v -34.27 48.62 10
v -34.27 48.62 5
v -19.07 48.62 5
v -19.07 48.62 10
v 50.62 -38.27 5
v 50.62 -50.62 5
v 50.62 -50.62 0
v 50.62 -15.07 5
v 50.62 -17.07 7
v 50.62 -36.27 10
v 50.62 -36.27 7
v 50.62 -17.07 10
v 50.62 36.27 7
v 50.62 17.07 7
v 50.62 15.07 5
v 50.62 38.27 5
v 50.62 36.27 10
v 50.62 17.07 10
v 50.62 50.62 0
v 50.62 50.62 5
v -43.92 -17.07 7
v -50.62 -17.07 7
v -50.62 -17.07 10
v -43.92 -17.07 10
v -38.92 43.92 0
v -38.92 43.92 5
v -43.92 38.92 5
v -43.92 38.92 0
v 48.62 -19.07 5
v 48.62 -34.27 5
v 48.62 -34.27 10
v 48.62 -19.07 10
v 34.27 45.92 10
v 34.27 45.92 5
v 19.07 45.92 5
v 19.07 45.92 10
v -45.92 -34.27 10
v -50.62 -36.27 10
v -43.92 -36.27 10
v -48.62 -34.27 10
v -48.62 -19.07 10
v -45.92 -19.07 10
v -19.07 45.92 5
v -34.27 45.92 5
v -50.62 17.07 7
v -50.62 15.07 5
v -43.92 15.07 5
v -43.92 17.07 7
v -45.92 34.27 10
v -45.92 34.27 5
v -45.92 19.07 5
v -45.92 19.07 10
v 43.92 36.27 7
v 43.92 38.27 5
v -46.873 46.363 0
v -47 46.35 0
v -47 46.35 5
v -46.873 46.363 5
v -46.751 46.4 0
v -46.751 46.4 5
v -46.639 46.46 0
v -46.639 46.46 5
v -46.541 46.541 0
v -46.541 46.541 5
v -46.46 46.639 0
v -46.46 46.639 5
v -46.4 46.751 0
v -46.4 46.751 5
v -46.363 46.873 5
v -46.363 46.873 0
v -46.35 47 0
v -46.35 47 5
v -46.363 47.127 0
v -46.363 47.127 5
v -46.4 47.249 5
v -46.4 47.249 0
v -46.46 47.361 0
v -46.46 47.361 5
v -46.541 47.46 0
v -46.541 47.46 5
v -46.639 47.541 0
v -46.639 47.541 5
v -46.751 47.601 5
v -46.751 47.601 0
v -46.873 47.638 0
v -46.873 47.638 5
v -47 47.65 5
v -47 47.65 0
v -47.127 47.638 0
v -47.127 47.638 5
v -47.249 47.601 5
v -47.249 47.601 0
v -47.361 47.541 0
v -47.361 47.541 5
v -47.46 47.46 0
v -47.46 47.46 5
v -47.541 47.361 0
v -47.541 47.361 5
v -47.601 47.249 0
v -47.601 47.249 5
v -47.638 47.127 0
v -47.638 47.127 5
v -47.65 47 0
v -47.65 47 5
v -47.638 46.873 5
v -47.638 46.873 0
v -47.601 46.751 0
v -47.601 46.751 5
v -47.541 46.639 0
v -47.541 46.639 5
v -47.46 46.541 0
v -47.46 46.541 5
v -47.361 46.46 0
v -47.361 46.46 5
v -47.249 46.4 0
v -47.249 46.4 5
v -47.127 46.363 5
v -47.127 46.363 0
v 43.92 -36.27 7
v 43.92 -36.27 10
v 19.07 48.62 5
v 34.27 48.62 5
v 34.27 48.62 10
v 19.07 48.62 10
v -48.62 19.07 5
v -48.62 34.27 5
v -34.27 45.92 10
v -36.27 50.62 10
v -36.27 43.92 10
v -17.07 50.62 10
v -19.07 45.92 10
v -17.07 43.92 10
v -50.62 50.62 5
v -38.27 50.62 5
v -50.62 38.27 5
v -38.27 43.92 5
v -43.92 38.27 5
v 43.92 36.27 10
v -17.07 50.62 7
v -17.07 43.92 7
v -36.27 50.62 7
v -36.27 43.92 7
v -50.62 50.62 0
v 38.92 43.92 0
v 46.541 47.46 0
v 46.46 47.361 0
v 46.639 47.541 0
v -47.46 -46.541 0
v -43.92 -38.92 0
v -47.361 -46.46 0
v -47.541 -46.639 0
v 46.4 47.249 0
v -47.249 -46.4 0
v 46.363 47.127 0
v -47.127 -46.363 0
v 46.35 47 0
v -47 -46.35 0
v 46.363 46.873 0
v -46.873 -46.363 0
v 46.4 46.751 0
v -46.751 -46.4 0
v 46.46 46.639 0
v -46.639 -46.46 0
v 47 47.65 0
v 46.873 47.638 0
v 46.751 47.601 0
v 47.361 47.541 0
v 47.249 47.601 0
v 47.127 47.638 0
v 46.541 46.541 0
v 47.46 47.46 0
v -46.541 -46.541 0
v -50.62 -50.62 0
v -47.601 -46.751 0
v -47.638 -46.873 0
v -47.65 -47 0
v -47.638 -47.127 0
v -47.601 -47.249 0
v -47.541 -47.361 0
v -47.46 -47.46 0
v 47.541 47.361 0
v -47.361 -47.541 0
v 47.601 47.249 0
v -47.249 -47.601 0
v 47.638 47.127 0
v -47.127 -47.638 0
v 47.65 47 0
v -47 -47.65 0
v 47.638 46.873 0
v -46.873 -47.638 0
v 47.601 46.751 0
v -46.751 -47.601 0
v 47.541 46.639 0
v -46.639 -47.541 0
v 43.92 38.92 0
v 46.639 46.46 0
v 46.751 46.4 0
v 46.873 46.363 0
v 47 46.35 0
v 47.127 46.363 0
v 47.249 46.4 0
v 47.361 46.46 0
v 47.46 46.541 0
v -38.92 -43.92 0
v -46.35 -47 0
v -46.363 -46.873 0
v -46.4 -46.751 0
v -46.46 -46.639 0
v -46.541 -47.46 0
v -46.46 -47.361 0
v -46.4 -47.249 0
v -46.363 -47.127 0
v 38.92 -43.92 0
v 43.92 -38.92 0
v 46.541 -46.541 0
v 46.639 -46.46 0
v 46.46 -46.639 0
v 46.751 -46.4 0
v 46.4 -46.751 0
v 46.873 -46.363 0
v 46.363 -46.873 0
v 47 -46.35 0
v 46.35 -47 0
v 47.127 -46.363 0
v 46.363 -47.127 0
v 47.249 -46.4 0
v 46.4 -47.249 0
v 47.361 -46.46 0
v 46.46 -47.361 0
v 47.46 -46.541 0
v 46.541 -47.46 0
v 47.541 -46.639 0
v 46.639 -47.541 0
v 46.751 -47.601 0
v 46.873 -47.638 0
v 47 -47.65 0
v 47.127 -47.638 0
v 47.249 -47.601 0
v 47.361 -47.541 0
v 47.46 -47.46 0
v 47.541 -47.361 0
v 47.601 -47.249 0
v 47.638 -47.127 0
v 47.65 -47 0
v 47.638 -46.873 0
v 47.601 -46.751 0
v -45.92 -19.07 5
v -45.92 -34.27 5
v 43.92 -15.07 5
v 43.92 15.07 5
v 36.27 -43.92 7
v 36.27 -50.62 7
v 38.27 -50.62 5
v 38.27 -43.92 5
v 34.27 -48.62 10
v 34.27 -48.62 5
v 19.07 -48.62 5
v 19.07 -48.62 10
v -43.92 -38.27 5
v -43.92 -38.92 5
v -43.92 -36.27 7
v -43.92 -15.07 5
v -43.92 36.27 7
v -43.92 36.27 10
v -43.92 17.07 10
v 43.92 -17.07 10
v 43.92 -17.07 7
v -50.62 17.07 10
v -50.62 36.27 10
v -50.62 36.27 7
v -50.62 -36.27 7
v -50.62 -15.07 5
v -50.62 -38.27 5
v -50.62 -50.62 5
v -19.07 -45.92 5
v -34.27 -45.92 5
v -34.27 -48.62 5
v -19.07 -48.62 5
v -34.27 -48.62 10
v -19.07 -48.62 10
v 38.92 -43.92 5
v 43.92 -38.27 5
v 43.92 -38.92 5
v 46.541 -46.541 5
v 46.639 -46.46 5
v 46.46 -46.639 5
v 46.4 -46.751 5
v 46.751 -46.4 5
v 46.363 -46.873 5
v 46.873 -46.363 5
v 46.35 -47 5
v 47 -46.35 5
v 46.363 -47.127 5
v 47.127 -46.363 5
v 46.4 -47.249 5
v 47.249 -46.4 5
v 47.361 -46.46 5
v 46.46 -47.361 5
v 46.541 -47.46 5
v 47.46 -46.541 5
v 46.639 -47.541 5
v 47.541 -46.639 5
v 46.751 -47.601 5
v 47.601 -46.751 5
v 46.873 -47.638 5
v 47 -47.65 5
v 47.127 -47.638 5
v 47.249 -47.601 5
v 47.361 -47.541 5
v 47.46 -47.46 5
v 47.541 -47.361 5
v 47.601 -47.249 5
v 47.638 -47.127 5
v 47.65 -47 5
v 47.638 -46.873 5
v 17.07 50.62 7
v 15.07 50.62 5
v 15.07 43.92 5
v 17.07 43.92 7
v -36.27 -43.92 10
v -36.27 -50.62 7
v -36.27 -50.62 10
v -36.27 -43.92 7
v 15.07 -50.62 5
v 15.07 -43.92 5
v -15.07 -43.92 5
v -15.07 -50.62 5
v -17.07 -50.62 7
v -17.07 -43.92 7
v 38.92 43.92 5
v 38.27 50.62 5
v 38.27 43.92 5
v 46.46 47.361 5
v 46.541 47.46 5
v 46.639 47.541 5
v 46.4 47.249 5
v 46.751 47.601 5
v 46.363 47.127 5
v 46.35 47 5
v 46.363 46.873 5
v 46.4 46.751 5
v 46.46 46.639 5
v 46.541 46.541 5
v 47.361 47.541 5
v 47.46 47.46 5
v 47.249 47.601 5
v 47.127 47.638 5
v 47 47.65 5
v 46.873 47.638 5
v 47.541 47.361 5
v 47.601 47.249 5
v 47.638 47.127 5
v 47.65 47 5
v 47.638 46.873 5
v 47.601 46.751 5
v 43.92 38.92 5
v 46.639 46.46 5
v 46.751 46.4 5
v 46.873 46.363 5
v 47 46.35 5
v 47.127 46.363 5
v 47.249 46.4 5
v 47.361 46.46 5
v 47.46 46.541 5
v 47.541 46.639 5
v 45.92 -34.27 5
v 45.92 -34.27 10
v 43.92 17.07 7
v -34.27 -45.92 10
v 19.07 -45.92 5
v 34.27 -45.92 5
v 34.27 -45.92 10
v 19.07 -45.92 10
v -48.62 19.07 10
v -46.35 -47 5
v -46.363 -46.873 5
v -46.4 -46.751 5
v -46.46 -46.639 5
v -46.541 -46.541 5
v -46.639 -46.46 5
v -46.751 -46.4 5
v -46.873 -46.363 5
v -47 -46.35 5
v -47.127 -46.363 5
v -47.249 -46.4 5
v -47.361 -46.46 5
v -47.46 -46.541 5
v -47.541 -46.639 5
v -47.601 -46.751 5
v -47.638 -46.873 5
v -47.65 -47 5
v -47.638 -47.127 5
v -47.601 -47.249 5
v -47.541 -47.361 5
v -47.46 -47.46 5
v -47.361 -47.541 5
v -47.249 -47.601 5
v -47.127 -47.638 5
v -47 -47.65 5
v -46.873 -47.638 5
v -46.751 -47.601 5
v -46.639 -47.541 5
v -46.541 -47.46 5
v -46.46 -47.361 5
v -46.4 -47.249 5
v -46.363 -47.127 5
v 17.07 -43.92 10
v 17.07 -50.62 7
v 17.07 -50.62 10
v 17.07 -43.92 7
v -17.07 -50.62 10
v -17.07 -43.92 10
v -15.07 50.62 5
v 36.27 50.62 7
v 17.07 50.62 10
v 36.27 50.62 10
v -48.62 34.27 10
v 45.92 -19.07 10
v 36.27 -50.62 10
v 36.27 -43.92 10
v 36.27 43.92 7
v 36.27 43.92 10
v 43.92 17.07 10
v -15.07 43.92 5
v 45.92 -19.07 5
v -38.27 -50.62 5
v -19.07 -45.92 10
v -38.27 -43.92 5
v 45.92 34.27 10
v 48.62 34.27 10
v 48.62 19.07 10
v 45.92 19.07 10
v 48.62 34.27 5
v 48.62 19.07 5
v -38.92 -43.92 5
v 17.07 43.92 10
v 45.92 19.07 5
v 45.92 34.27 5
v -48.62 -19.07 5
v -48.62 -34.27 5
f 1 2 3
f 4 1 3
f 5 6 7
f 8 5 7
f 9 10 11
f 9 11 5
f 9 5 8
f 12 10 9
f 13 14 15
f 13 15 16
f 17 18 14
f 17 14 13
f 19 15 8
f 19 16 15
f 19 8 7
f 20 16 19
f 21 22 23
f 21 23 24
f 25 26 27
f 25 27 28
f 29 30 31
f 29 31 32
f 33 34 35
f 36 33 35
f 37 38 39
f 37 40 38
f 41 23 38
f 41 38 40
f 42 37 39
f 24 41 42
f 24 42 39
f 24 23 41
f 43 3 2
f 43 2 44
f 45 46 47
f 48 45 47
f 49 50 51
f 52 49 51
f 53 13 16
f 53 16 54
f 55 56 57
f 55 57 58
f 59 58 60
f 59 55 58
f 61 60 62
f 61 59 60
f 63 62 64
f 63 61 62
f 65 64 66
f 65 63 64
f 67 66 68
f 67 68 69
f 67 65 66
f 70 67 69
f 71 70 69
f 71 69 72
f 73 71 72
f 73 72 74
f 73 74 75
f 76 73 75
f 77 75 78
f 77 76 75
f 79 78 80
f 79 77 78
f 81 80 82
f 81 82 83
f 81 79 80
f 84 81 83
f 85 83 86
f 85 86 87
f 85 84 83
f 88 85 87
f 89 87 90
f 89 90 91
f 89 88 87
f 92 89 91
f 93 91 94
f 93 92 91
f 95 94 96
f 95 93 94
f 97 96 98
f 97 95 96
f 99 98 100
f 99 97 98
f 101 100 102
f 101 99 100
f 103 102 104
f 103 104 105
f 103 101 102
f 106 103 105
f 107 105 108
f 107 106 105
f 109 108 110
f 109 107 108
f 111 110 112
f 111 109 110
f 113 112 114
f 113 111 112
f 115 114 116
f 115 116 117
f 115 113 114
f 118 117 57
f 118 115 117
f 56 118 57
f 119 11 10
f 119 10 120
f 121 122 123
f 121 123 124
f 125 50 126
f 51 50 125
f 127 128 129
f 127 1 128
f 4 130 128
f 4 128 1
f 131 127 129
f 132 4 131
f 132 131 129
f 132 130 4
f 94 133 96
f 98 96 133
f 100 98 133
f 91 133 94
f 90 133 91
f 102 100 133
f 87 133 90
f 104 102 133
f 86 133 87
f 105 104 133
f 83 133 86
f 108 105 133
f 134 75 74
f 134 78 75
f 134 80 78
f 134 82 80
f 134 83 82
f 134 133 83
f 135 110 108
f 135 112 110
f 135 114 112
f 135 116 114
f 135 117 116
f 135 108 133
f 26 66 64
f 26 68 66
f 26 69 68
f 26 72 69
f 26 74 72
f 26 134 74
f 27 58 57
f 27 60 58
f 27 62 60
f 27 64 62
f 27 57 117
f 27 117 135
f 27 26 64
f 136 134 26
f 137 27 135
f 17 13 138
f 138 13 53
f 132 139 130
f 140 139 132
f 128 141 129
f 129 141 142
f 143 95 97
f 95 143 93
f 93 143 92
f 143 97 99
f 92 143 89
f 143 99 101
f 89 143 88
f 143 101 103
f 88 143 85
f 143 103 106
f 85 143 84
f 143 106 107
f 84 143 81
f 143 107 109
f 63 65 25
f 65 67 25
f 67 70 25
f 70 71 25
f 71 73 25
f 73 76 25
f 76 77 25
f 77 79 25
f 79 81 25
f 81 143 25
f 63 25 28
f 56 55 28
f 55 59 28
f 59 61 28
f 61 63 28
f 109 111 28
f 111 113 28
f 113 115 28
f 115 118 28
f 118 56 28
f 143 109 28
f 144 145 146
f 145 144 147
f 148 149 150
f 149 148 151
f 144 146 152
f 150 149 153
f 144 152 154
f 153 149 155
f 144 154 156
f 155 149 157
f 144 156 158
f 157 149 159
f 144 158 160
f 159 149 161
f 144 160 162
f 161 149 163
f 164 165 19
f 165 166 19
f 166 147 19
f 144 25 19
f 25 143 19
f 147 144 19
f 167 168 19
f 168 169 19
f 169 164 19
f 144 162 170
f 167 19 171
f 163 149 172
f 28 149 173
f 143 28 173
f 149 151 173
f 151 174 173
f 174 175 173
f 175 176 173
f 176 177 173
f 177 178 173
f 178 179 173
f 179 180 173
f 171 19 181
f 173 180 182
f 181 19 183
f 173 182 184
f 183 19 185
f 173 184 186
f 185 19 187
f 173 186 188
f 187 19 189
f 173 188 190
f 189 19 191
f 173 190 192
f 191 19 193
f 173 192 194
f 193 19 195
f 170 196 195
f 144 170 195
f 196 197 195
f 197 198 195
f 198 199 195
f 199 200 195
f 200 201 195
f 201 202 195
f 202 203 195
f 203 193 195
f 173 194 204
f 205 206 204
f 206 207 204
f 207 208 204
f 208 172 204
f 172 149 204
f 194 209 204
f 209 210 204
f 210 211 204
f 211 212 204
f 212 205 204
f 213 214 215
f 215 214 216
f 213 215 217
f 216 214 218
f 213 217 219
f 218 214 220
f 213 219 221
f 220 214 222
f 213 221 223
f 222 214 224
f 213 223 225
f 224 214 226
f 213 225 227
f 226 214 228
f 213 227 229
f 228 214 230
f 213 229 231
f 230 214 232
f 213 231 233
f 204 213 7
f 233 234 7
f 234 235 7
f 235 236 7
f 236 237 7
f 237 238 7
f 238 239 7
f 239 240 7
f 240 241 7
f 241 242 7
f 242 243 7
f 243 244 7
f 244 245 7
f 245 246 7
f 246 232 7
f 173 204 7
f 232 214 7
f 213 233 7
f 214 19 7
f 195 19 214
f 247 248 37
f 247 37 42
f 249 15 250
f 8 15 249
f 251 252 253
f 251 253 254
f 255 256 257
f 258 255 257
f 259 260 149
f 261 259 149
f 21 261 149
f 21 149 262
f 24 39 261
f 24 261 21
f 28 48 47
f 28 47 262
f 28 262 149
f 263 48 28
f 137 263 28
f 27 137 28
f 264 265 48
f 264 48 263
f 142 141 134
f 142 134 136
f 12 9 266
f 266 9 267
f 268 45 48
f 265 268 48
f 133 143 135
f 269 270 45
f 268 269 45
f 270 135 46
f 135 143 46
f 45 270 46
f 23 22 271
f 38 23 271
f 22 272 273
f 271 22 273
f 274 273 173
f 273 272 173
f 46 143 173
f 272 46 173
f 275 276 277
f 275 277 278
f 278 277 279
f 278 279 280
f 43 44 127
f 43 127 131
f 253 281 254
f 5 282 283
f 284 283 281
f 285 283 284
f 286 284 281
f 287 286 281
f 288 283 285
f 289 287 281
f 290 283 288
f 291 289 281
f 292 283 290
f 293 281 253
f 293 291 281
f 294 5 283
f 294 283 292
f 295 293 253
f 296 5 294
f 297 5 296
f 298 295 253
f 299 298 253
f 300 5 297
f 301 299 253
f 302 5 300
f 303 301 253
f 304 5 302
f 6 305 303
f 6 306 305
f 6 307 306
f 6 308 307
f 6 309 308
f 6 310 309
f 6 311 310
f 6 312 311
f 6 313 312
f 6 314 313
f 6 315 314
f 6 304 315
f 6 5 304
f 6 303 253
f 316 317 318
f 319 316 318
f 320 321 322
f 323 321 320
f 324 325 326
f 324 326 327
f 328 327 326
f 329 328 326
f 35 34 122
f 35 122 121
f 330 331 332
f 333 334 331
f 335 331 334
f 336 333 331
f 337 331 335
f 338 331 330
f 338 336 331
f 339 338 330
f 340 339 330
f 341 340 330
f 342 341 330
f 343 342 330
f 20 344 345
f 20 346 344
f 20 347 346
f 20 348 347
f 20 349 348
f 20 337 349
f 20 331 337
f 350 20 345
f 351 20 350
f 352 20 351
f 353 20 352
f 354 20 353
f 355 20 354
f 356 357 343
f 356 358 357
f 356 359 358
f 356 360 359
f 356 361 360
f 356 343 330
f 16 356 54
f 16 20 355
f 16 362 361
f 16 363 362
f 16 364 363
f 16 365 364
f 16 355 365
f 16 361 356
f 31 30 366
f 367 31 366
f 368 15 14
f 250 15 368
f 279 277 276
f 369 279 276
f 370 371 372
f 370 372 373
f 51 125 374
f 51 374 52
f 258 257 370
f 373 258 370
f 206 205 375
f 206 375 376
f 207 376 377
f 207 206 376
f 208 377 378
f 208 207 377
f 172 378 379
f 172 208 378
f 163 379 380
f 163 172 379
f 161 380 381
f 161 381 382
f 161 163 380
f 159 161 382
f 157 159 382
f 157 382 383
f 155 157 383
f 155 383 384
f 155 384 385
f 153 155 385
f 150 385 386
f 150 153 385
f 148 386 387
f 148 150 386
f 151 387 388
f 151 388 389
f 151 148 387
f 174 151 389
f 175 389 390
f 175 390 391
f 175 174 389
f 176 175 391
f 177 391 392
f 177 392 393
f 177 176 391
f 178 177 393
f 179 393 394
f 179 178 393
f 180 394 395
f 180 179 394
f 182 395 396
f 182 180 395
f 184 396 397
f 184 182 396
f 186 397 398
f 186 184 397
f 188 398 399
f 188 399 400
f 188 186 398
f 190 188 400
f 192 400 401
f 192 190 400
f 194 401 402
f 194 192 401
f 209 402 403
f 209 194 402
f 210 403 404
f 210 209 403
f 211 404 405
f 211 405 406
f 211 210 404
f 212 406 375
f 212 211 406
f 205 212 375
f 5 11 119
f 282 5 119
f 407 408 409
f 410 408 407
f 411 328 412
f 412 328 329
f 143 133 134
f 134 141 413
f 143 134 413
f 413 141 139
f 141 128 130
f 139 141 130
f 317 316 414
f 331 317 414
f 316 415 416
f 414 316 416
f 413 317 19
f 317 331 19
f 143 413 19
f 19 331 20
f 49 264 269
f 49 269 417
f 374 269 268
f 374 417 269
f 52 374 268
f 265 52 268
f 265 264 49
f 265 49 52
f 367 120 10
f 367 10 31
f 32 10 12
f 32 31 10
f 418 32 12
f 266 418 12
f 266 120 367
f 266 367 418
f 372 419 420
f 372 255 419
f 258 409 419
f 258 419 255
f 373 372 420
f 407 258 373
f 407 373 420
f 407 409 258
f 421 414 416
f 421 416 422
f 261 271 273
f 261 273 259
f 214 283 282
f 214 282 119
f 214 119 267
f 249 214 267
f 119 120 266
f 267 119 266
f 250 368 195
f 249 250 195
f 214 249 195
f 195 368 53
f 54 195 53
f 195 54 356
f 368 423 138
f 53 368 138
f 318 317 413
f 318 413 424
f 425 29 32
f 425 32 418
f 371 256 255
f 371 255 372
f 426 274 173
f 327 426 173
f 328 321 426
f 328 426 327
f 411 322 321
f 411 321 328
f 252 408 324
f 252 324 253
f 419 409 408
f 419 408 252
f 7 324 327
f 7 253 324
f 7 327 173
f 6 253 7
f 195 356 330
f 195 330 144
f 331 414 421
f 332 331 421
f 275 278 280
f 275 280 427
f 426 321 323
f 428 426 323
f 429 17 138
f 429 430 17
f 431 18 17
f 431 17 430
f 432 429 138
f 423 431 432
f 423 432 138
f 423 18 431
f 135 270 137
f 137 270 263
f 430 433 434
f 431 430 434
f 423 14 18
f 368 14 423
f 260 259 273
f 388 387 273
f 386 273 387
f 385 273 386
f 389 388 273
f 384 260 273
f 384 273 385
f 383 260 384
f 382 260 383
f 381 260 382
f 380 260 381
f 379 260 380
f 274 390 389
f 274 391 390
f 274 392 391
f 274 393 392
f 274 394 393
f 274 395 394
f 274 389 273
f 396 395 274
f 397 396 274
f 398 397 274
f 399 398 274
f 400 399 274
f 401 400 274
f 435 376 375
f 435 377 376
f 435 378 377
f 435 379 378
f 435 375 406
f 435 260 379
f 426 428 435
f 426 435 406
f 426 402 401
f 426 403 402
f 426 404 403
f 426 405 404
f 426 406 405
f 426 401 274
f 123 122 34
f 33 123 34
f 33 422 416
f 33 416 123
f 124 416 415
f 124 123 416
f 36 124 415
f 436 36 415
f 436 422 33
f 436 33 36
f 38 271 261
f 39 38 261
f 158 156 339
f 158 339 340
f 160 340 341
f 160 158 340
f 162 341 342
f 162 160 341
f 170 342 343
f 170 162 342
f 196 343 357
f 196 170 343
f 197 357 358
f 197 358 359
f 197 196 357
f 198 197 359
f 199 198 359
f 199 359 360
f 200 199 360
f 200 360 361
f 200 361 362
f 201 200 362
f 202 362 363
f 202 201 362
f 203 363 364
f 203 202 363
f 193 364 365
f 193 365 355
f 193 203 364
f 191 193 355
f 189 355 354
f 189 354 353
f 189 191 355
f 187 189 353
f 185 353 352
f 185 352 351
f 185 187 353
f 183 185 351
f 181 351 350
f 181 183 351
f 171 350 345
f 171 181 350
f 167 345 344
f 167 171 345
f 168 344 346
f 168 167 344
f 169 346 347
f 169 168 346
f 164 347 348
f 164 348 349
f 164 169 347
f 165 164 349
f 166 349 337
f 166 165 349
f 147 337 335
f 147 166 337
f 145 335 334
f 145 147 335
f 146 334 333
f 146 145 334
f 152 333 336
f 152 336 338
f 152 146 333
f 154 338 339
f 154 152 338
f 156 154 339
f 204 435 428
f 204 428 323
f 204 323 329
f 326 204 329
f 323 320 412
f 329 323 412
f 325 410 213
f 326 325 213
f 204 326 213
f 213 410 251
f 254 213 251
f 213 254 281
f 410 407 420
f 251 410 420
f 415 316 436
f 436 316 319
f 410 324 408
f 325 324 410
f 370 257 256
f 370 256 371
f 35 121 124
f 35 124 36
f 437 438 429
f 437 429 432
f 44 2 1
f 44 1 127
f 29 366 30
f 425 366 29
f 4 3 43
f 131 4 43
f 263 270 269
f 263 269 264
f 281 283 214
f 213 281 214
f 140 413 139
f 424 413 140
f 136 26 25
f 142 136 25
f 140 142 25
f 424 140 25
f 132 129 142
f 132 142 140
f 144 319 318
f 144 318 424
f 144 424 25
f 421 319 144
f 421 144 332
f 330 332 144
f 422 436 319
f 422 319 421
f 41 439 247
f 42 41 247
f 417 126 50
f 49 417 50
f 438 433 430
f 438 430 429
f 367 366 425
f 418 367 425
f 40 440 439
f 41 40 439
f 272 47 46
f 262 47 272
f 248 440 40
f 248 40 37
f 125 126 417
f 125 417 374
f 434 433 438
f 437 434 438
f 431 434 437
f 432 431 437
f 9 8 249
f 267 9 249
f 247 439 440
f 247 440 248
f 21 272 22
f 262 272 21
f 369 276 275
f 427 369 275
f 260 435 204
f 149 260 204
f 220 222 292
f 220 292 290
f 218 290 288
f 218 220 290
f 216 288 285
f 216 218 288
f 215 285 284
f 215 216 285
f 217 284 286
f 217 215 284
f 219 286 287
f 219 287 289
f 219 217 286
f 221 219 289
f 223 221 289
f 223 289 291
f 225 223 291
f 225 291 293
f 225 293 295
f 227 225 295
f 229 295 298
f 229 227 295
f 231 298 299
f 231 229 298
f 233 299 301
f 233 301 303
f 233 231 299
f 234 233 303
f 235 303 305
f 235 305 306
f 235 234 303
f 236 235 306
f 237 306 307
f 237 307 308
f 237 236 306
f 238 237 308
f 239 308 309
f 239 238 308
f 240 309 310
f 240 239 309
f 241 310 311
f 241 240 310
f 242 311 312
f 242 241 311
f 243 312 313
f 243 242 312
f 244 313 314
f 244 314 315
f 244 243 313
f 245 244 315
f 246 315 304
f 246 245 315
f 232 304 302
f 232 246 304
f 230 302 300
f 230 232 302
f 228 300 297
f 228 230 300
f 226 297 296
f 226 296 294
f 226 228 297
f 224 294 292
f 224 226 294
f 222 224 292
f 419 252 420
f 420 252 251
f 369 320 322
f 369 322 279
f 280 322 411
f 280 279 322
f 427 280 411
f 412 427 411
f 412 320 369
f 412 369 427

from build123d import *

# Parameters (mm, degrees)
SKETCH_R           = 0.65
PAD_DEPTH          = 5
SKETCH001_W        = 19.2
SKETCH001_H        = 6.7
SKETCH001_W_2      = 15.2
SKETCH001_H_2      = 2.7
SKETCH001_W_3      = 6.7
SKETCH001_H_3      = 19.2
SKETCH001_W_4      = 2.7
SKETCH001_H_4      = 15.2
PAD001_DEPTH       = 5
POLARPATTERN_COUNT = 4
SKETCH002_W        = 87.84
SKETCH002_H        = 87.84
POCKET_DEPTH       = 5
SKETCH003_W        = 186.050454
SKETCH003_H        = 194.116951
SKETCH003_W_2      = 101.24
SKETCH003_H_2      = 101.24
POCKET001_DEPTH    = 5
CHAMFER_SIZE       = 5
CHAMFER001_SIZE    = 2


with BuildPart() as part:
    # Sketch → Pad (new body)
    with BuildSketch(Plane.XY):
        Polygon((-52.00016, -52.00016), (0, -52.00016), (0, -42.00016), (-34.929092, -42.00016), (0, -7.071068), (0, 0), (-7.071068, 0), (-42.00016, -34.929092), (-42.00016, 0), (-52.00016, 0), align=None)
        with Locations((-47.00016, -47.00016)):
            Circle(SKETCH_R, mode=Mode.SUBTRACT)
        with Locations((-26.67, -26.67)):
            Circle(SKETCH_R, mode=Mode.SUBTRACT)
    pad = extrude(amount=PAD_DEPTH)

    # Sketch001 (on Face14 of Pad) → Pad001 (join)
    with BuildSketch(Plane.XY.offset(5)):
        with Locations((-26.67, -47.27)):
            Rectangle(SKETCH001_W, SKETCH001_H)
        with Locations((-26.67, -47.27)):
            Rectangle(SKETCH001_W_2, SKETCH001_H_2, mode=Mode.SUBTRACT)
        with Locations((-47.27, -26.67)):
            Rectangle(SKETCH001_W_3, SKETCH001_H_3)
        with Locations((-47.27, -26.67)):
            Rectangle(SKETCH001_W_4, SKETCH001_H_4, mode=Mode.SUBTRACT)
    pad001 = extrude(amount=PAD001_DEPTH)

    # PolarPattern: Pad, Pad001 ×4 about axis
    polarpattern_axis = Axis((0, 0, 0), (0, 0, 1))
    for i in range(1, POLARPATTERN_COUNT):
        add(pad.rotate(polarpattern_axis, i * 360 / POLARPATTERN_COUNT))
        add(pad001.rotate(polarpattern_axis, i * 360 / POLARPATTERN_COUNT))

    # Sketch002 (on Face20 of PolarPattern) → Pocket (cut)
    with BuildSketch(Plane.XY.offset(5)):
        Rectangle(SKETCH002_W, SKETCH002_H)
    extrude(amount=-POCKET_DEPTH, mode=Mode.SUBTRACT)

    # Sketch003 (on Face5 of Pocket) → Pocket001 (cut)
    with BuildSketch(Plane.XY.offset(5)):
        with Locations((-8.059452, 19.223796)):
            Rectangle(SKETCH003_W, SKETCH003_H)
        Rectangle(SKETCH003_W_2, SKETCH003_H_2, mode=Mode.SUBTRACT)
    extrude(amount=-POCKET001_DEPTH, mode=Mode.SUBTRACT)

    # Chamfer
    chamfer_edges = [part.edges().sort_by_distance(p)[0] for p in [
        (43.92, 43.92, 2.5),
        (43.92, -43.92, 2.5),
        (-43.92, -43.92, 2.5),
        (-43.92, 43.92, 2.5),
    ]]
    chamfer(chamfer_edges, length=CHAMFER_SIZE)

    # Chamfer001
    chamfer001_edges = [part.edges().sort_by_distance(p)[0] for p in [
        (17.07, 47.27, 5),
        (-36.27, 47.27, 5),
        (-47.27, 17.07, 5),
        (-47.27, -36.27, 5),
        (-36.27, -47.27, 5),
        (17.07, -47.27, 5),
        (47.27, -36.27, 5),
        (47.27, 17.07, 5),
        (36.27, 47.27, 5),
        (-17.07, 47.27, 5),
        (-47.27, 36.27, 5),
        (-47.27, -17.07, 5),
        (-17.07, -47.27, 5),
        (36.27, -47.27, 5),
        (47.27, -17.07, 5),
        (47.27, 36.27, 5),
    ]]
    chamfer(chamfer001_edges, length=CHAMFER001_SIZE)


solid = part.part
